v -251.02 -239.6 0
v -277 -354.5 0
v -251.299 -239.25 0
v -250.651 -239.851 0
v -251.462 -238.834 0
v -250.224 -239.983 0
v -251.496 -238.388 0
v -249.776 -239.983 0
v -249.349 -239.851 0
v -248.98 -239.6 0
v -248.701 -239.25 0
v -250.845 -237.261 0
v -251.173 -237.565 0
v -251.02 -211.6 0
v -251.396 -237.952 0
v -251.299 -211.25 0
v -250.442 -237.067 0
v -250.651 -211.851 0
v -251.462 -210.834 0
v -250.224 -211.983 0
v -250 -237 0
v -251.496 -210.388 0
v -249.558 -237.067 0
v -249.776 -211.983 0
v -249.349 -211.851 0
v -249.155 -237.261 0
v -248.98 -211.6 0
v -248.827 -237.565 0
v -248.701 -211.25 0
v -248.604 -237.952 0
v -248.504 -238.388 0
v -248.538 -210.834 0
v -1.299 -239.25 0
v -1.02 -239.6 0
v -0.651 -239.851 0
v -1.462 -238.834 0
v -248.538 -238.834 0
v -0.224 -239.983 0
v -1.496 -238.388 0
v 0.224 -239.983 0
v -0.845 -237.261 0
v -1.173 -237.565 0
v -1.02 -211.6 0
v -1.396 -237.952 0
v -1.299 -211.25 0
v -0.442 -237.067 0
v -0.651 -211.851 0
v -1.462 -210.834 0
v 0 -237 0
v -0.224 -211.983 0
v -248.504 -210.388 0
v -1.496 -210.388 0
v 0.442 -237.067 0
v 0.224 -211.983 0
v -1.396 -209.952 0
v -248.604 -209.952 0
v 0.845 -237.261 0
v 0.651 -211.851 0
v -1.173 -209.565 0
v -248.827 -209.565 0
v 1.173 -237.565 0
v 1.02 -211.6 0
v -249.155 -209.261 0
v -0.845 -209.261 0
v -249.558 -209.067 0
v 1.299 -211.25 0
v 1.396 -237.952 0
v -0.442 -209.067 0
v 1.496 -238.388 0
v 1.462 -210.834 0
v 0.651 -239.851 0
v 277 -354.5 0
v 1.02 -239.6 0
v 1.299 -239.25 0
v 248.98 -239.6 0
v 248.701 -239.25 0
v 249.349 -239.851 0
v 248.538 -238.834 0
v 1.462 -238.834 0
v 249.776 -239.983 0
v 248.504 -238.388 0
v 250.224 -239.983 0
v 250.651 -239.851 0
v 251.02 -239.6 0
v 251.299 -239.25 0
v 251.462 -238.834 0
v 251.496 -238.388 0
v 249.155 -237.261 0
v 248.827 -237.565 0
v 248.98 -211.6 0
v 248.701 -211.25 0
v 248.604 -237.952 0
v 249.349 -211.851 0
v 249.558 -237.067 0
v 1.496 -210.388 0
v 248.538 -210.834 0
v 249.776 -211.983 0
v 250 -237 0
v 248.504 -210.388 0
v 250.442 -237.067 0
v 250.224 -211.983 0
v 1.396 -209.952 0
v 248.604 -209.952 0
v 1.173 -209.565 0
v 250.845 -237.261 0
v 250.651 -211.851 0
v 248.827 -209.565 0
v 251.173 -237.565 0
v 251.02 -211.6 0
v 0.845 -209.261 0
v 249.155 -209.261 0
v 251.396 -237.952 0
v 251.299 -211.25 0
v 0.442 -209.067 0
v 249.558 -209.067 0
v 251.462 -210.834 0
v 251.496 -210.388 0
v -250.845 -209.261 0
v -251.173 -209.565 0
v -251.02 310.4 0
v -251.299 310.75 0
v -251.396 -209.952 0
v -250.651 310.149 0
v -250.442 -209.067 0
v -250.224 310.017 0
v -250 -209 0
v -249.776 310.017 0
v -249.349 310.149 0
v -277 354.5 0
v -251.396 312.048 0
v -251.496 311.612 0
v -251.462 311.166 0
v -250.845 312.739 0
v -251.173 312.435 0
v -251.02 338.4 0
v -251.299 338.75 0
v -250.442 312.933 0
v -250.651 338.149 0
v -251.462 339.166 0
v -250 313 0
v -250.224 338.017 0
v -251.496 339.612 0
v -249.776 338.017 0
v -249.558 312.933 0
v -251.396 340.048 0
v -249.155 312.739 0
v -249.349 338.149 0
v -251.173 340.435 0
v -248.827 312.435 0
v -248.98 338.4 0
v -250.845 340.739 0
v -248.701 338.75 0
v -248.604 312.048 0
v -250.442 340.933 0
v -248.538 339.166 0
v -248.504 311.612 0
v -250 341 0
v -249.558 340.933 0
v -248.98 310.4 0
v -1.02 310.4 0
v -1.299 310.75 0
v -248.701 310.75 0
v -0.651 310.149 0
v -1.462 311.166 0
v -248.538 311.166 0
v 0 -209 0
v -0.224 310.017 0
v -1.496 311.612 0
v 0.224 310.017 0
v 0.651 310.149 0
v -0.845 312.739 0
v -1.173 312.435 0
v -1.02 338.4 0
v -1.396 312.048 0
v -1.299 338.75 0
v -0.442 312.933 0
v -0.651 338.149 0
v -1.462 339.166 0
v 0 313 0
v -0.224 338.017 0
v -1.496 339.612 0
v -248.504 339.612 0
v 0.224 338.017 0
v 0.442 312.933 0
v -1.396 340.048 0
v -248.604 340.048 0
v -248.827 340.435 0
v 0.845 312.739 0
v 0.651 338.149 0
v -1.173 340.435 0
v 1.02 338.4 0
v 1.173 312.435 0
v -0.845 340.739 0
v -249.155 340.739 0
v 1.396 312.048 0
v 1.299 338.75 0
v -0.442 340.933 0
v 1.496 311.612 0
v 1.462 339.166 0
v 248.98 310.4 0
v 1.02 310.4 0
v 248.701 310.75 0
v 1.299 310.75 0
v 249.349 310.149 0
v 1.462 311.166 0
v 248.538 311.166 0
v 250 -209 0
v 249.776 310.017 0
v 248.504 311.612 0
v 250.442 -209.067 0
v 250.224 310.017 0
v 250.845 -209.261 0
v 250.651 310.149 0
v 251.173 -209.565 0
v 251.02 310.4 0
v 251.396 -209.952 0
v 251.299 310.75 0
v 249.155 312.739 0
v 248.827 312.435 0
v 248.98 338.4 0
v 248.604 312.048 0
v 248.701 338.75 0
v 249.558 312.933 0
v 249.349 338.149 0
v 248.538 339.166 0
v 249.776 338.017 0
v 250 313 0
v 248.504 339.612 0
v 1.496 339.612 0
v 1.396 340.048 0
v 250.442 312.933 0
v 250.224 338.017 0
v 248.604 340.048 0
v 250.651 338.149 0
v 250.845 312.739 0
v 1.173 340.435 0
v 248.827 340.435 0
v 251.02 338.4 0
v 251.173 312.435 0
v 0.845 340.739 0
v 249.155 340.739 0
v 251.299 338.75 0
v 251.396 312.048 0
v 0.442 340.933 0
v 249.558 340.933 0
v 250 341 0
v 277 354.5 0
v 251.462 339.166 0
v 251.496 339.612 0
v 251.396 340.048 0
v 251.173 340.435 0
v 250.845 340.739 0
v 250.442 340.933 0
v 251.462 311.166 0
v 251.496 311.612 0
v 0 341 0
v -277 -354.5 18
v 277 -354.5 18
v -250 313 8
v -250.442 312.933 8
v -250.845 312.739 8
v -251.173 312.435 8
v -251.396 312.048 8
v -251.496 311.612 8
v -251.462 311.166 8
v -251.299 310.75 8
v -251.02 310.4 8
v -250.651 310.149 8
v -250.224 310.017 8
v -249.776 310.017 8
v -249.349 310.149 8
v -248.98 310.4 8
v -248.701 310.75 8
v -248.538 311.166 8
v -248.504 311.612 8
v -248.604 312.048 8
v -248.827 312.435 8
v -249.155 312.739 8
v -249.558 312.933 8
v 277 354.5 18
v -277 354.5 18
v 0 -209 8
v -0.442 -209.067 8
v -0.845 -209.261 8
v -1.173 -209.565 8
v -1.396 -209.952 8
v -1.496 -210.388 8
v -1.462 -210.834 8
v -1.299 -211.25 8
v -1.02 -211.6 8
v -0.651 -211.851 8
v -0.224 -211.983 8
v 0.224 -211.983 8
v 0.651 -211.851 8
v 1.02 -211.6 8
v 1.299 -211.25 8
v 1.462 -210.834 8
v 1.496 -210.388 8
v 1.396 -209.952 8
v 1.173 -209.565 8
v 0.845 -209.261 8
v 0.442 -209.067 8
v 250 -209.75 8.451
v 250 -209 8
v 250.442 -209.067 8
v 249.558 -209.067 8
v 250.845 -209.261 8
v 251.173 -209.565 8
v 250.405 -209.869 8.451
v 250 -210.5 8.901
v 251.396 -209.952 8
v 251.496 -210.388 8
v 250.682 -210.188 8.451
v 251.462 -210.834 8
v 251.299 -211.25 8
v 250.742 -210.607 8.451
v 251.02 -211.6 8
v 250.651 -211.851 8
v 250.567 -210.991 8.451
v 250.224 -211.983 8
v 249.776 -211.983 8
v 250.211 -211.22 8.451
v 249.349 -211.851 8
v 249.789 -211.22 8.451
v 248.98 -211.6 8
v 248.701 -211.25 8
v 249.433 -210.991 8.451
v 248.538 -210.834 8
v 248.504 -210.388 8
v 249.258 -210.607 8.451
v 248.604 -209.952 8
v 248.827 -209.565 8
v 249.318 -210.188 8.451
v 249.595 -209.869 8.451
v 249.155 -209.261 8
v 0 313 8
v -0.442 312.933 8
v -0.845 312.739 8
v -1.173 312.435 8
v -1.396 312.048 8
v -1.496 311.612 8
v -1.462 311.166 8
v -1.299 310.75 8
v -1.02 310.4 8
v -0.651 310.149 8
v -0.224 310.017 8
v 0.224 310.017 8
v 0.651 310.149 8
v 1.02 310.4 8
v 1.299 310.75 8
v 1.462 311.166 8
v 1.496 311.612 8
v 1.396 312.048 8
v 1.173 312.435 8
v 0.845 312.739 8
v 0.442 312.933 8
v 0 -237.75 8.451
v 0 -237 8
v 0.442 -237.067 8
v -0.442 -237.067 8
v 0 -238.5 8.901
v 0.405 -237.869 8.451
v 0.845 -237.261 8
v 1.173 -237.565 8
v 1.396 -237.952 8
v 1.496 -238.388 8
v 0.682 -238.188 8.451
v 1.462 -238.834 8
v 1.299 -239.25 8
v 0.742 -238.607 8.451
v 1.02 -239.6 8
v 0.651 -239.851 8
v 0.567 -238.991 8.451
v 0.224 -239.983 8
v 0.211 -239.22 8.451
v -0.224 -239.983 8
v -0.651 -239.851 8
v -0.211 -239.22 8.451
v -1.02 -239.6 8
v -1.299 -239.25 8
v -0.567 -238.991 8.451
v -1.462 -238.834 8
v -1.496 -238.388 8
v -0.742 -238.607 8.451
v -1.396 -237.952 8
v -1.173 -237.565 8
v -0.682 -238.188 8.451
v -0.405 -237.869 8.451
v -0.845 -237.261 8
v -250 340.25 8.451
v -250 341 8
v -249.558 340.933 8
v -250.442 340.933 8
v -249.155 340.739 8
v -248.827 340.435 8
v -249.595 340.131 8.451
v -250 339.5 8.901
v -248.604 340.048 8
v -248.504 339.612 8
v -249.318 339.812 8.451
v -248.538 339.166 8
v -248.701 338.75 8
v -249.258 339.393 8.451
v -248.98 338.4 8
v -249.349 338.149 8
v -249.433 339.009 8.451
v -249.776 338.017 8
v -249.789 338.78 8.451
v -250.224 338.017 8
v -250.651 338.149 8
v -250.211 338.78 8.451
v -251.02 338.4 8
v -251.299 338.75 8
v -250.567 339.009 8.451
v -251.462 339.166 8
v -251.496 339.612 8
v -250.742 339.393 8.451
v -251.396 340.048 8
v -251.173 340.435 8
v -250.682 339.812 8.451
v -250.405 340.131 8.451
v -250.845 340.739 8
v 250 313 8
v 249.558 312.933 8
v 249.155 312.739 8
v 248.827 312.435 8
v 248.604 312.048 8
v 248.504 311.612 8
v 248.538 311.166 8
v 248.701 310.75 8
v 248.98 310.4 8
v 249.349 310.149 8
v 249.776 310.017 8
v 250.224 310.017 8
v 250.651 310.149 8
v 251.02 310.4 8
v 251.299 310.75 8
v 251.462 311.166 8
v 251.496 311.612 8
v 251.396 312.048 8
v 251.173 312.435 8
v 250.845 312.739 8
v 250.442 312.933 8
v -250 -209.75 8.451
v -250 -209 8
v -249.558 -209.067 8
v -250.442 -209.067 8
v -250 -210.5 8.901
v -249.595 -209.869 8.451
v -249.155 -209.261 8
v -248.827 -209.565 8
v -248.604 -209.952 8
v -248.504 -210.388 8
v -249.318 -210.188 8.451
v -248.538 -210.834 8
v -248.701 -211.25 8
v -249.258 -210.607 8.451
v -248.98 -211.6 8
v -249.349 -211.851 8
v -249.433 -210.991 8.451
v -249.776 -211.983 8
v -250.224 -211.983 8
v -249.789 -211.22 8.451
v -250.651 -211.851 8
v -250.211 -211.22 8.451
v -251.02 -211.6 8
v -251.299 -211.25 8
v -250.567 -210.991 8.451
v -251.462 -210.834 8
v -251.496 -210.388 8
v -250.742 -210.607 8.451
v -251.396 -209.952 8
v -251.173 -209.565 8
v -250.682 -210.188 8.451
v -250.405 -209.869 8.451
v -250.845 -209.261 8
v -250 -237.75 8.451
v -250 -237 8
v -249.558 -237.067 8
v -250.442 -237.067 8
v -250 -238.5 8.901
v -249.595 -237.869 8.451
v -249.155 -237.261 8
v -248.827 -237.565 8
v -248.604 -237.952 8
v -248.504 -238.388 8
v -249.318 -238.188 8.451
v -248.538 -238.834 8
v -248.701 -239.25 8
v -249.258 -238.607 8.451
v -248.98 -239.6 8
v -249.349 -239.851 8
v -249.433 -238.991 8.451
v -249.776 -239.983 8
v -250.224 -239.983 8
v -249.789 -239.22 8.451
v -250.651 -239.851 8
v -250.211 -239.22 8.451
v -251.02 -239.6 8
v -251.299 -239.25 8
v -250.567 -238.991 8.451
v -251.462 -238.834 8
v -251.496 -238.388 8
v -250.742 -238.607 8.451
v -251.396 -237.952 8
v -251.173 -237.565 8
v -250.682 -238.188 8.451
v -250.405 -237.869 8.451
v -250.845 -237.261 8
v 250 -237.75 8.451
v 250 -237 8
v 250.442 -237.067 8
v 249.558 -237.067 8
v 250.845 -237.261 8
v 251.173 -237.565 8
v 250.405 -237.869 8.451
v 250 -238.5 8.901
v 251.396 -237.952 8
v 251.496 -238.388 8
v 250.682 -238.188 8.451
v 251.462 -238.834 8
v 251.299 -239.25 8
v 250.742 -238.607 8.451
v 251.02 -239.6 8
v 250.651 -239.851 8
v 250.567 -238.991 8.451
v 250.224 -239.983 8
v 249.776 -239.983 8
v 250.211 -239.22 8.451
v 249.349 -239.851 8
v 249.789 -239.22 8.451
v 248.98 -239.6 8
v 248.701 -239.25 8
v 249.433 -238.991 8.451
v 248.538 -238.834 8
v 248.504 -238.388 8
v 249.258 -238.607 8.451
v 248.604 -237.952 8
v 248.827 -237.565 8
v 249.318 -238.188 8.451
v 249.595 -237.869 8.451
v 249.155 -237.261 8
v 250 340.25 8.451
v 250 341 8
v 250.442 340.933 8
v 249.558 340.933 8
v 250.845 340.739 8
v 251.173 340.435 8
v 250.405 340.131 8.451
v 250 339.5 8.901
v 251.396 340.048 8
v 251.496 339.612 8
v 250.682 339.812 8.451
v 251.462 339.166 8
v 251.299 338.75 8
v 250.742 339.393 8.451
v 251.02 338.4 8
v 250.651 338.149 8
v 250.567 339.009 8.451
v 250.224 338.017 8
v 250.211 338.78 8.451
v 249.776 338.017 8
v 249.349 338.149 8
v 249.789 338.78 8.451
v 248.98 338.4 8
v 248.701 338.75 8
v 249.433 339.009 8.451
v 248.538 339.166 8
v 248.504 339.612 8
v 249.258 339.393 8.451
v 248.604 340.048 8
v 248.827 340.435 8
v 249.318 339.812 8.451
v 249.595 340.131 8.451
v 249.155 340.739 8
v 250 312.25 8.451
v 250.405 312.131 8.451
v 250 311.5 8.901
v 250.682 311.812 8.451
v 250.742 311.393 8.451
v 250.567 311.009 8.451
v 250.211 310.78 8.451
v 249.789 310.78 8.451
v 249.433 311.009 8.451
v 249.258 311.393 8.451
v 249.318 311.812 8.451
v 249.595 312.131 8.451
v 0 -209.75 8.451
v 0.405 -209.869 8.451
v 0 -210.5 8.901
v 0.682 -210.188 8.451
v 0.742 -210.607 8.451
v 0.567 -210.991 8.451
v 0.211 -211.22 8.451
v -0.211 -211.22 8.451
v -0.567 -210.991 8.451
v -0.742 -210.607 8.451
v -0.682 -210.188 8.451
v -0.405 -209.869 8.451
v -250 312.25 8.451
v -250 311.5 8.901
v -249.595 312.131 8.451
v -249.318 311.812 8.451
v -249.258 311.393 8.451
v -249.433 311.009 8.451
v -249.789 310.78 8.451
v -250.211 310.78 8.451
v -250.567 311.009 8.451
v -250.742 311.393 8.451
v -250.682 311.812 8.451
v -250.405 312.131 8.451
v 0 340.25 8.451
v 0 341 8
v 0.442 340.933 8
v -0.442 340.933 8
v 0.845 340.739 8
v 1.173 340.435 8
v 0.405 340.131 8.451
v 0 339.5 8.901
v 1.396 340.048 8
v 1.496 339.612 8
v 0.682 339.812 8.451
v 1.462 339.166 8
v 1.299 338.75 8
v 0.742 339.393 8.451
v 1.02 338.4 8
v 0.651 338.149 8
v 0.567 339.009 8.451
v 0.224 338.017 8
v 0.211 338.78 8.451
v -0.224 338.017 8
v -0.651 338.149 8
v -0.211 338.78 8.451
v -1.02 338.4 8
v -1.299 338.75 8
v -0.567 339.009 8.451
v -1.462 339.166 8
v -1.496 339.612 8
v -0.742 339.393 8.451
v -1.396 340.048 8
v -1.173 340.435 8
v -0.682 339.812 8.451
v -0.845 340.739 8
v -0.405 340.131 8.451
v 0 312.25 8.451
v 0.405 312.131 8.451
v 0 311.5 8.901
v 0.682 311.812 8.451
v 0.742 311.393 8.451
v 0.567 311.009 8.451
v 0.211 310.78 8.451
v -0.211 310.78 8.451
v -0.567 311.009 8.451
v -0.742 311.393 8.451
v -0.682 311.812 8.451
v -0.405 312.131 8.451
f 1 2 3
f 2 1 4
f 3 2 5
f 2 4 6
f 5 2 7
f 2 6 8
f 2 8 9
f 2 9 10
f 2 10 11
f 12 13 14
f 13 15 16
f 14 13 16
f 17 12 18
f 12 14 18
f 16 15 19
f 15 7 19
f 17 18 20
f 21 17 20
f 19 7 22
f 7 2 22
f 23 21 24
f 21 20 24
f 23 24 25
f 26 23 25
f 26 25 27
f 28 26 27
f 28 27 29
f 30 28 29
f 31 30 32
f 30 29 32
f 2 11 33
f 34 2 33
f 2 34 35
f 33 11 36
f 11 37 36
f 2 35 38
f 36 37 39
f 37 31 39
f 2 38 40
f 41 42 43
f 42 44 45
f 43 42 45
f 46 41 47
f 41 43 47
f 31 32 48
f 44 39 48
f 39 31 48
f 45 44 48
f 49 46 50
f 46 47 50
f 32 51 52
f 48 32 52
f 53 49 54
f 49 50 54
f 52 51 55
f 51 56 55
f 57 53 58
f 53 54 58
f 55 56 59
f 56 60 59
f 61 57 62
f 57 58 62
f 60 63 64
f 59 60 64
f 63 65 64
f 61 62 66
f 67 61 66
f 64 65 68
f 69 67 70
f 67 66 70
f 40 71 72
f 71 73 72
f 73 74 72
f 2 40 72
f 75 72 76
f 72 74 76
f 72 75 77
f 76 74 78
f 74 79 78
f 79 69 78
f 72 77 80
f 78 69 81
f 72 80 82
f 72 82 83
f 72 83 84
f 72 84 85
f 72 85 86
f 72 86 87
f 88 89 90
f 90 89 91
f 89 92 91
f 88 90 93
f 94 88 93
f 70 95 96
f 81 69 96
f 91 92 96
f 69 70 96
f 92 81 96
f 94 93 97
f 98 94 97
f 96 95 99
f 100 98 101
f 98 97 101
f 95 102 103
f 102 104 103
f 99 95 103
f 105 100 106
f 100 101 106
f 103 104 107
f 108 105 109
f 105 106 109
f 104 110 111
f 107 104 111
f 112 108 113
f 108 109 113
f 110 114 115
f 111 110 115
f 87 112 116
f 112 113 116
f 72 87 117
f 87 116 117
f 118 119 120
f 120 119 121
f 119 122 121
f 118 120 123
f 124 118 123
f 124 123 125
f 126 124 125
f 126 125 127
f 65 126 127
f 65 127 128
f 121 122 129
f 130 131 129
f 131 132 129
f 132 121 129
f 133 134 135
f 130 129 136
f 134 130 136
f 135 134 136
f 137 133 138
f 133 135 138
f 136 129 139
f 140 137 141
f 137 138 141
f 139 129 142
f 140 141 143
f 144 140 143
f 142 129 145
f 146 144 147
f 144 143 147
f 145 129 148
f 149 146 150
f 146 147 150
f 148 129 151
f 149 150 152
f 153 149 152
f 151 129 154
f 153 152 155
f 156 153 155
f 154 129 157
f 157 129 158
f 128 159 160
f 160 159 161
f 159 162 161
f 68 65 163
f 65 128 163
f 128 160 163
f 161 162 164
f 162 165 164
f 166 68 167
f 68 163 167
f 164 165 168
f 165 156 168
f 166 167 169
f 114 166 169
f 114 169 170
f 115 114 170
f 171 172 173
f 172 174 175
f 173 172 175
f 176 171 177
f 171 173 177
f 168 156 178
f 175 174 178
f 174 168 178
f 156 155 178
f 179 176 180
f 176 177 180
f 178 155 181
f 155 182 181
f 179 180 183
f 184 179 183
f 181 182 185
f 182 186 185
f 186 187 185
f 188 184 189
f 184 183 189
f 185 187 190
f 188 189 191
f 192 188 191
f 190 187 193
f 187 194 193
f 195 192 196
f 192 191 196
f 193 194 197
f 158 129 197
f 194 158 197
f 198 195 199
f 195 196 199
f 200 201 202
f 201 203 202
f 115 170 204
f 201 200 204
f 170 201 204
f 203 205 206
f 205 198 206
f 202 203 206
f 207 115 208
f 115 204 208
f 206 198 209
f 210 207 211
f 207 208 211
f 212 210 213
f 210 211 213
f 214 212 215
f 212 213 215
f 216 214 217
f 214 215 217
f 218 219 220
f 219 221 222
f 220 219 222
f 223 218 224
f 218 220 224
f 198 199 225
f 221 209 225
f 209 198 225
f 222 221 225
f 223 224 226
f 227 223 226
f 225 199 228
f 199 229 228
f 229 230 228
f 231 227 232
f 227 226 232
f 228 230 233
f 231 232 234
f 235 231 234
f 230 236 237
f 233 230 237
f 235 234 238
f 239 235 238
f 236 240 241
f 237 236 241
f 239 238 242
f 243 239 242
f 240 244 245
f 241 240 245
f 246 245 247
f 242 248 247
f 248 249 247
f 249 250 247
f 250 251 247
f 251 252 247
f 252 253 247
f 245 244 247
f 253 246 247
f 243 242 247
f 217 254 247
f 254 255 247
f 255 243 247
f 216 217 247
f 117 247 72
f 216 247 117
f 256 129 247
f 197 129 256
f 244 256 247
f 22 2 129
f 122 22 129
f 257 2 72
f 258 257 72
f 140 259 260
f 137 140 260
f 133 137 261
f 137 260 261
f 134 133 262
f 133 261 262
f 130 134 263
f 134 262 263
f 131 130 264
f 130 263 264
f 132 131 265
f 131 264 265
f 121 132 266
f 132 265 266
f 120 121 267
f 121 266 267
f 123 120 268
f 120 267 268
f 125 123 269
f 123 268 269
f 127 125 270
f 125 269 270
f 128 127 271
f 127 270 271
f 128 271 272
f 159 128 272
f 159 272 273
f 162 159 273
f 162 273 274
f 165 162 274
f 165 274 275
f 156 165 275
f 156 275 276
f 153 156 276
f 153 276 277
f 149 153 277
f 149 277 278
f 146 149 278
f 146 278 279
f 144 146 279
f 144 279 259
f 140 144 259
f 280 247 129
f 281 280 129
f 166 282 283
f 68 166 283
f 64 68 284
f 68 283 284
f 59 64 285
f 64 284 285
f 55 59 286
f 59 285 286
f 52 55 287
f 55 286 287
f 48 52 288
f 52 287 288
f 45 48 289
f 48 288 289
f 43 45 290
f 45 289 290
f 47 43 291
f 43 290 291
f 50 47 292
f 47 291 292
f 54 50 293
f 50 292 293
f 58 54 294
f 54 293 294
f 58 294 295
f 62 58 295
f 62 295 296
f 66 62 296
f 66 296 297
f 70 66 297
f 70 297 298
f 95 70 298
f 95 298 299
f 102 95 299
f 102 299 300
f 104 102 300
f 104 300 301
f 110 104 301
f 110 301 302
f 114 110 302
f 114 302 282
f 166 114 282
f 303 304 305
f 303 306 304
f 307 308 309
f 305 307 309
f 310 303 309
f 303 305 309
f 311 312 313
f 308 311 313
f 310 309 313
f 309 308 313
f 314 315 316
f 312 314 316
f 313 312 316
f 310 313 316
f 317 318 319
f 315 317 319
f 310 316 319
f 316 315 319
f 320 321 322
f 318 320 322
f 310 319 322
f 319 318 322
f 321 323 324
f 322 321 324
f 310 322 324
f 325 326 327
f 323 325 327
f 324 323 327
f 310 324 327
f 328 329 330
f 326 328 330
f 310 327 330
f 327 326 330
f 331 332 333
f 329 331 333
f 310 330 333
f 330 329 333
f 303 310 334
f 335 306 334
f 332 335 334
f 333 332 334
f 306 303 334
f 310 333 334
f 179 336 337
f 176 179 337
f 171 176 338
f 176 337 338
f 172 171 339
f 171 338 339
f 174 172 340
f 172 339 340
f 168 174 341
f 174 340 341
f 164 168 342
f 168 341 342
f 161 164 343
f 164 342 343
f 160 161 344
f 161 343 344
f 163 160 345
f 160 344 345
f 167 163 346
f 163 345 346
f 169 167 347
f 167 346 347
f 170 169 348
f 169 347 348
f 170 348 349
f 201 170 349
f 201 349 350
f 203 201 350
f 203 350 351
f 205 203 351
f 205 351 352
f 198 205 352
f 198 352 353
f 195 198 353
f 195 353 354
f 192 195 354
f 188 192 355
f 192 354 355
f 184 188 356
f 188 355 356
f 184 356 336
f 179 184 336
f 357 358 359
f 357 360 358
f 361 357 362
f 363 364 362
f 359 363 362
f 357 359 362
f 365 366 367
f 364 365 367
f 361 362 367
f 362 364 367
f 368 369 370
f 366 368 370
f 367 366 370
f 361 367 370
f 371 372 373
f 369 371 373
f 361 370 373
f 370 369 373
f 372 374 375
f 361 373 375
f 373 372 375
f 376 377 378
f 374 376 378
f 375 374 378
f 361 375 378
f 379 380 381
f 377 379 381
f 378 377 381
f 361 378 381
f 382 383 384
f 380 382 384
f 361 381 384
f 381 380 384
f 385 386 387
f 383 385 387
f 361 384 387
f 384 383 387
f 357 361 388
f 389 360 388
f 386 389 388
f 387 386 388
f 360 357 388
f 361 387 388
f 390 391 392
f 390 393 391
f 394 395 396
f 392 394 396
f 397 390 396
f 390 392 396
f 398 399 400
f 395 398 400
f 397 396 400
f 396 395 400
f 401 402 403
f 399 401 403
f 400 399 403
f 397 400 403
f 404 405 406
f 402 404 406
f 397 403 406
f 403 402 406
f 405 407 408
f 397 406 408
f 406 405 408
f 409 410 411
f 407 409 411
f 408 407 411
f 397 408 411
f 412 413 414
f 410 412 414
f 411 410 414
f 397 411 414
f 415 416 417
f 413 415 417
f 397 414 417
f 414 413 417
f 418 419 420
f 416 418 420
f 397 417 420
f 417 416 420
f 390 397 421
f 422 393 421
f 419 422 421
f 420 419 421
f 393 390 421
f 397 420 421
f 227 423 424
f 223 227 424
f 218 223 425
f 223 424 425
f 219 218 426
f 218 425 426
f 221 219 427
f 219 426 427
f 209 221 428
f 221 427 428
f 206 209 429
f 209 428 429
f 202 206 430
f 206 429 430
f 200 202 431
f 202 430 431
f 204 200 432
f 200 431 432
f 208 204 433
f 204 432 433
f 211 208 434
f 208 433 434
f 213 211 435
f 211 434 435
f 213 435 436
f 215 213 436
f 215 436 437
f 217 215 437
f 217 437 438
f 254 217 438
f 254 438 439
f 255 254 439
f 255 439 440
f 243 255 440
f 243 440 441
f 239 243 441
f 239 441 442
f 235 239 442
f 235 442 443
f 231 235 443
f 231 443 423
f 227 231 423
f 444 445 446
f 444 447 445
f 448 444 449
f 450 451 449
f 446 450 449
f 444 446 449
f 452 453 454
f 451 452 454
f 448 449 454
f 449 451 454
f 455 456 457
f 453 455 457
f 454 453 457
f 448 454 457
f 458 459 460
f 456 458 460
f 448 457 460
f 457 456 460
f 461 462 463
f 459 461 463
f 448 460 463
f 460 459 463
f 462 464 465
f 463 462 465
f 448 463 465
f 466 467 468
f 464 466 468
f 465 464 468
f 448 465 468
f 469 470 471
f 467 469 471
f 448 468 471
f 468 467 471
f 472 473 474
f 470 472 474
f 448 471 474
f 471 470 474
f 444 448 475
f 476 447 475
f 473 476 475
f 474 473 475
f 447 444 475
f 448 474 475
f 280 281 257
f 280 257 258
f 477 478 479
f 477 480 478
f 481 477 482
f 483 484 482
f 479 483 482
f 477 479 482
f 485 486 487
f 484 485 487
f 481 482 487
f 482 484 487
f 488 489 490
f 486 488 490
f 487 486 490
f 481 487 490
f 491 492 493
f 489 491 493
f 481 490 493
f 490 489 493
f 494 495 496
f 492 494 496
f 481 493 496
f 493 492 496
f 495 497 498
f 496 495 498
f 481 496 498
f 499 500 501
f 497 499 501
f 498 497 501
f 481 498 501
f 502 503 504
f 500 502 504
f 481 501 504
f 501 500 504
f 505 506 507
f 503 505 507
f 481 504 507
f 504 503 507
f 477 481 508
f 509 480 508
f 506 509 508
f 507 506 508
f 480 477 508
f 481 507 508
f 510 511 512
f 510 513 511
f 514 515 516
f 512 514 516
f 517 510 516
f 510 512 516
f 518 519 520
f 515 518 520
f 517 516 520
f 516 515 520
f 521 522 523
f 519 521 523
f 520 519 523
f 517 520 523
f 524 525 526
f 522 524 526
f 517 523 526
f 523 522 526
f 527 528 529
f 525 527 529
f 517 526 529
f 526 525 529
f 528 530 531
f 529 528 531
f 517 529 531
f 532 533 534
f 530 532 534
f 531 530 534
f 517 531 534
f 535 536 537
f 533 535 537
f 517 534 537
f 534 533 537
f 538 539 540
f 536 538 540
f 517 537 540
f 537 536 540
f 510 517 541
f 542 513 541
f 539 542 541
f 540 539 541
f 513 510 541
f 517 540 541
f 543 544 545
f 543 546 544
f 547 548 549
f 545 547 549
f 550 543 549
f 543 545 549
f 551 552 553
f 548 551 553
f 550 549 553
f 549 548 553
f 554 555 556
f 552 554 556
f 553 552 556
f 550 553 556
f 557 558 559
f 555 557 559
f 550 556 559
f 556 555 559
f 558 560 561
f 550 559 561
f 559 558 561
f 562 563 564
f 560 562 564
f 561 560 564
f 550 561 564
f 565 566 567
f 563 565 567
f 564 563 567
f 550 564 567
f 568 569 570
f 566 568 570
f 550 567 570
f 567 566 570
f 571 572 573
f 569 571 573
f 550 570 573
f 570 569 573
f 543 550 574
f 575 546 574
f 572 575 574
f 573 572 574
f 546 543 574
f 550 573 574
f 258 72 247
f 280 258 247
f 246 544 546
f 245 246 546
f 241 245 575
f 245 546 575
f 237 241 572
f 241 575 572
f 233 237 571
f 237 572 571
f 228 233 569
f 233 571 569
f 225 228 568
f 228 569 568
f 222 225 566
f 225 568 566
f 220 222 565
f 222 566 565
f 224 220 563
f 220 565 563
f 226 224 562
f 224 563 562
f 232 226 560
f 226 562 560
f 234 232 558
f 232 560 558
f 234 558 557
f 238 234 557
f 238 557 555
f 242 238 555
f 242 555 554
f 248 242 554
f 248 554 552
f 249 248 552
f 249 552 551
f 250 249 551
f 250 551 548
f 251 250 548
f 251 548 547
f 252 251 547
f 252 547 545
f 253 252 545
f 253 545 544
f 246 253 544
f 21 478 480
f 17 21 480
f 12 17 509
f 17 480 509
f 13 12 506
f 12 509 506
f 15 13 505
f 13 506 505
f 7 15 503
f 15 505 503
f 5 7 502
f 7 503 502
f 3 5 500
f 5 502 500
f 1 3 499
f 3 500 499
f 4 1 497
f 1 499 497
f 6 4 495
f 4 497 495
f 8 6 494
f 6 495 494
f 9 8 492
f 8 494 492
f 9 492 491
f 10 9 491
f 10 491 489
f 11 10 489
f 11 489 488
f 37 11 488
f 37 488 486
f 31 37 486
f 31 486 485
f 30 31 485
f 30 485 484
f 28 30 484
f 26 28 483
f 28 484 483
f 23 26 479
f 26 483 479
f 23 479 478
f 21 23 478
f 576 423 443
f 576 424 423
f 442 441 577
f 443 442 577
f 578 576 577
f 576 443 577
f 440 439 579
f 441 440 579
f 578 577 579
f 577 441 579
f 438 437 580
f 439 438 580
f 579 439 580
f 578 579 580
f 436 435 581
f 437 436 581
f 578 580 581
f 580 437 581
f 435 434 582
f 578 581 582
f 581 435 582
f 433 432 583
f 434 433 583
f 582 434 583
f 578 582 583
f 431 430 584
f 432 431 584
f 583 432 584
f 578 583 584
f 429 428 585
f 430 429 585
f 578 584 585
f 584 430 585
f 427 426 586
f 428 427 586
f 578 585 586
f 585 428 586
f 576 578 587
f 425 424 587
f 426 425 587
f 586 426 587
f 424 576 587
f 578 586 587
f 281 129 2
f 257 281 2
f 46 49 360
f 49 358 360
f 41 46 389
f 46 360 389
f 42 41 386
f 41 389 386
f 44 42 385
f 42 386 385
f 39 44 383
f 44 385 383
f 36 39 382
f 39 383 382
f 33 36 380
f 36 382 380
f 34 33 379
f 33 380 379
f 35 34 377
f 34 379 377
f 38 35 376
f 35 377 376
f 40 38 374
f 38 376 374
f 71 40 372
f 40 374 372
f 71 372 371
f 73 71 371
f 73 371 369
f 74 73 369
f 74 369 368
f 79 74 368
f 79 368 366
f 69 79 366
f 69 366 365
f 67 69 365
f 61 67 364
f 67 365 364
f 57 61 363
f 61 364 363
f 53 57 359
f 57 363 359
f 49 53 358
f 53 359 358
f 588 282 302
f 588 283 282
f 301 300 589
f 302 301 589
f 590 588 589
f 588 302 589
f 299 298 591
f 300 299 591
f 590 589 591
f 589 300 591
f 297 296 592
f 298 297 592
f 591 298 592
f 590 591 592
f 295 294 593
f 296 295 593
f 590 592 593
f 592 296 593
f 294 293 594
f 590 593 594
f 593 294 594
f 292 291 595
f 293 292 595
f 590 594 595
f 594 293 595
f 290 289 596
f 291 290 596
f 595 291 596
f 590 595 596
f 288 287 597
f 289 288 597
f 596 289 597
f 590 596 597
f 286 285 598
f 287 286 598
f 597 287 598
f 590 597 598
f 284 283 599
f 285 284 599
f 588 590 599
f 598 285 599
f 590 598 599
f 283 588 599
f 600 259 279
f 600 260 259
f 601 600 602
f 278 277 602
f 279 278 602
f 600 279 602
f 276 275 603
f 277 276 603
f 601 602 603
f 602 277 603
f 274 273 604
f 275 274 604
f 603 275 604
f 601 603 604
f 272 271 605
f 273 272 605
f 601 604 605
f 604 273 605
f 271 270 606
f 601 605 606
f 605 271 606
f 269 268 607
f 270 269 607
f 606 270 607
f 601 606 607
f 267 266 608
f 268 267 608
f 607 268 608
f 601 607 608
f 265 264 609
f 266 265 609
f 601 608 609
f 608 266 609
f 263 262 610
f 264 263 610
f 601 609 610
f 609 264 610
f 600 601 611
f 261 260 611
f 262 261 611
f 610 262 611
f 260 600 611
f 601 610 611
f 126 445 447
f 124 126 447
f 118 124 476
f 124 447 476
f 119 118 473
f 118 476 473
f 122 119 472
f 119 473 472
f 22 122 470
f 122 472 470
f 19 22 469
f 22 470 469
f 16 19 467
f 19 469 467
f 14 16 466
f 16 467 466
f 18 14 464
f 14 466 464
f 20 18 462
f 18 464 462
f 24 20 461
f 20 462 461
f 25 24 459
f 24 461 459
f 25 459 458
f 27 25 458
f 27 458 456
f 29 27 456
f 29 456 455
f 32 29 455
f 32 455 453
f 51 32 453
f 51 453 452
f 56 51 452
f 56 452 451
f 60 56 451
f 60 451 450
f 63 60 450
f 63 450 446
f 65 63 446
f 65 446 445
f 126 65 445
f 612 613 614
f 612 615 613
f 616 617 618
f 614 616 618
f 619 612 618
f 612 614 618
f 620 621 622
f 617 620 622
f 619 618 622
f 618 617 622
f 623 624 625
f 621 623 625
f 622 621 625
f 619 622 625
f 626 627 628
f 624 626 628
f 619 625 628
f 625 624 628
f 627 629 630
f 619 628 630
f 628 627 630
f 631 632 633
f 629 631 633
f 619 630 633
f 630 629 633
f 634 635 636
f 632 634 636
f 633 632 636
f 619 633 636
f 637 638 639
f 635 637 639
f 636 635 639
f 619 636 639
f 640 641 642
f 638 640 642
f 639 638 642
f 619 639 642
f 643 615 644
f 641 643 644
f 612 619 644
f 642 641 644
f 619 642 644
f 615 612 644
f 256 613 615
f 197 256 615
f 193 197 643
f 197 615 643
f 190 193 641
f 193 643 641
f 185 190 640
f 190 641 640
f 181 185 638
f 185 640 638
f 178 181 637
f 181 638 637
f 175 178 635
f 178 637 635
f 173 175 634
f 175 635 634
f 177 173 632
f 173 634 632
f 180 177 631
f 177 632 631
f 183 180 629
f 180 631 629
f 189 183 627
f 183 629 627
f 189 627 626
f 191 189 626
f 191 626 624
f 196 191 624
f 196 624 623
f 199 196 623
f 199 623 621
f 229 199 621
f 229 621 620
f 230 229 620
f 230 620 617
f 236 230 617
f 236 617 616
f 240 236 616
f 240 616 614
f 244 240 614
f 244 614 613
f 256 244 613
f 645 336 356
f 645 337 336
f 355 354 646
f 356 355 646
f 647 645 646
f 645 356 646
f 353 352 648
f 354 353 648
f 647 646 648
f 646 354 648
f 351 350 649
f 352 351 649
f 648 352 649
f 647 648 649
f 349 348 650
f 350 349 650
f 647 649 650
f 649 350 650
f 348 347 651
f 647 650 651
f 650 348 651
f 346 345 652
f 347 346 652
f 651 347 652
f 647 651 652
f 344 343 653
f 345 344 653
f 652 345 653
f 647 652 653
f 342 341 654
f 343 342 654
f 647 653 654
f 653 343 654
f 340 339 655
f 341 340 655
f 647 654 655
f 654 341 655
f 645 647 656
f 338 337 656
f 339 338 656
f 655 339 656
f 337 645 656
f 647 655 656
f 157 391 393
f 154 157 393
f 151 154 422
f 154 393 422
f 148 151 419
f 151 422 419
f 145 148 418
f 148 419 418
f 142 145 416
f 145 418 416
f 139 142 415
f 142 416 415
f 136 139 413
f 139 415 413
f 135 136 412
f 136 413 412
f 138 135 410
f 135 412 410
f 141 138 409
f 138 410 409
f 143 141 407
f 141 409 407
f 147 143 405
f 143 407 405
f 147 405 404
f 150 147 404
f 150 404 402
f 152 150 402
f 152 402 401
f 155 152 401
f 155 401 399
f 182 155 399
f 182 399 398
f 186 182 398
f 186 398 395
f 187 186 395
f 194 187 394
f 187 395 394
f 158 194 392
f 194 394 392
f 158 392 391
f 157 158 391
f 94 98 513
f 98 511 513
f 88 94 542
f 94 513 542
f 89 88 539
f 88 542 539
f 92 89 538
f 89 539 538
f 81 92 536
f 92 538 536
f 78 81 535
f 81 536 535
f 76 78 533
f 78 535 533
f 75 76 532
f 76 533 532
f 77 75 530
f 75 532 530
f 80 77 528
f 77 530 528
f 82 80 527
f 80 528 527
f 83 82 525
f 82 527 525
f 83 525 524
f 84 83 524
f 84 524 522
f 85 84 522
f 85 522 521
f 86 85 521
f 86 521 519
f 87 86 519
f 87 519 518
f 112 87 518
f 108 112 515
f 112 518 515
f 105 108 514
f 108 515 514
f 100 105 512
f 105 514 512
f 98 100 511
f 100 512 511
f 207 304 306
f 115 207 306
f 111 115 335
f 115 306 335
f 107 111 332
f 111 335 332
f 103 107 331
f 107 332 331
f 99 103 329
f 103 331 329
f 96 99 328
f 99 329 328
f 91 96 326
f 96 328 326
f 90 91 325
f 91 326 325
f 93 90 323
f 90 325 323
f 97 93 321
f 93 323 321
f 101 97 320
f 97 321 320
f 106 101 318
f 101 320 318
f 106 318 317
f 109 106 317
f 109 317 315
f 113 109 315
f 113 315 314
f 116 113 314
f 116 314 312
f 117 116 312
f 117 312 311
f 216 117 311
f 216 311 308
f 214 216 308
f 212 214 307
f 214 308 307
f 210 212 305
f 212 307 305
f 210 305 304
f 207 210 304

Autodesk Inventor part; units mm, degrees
ref_plane "YZ Plane" through (0, 0, 0) normal (1, 0, 0) x (0, 1, 0)
ref_plane "XZ Plane" through (0, 0, 0) normal (0, 1, 0) x (-1, 0, 0)
ref_plane "XY Plane" through (0, 0, 0) normal (0, 0, 1) x (1, 0, 0)
sketch "Sketch1" plane through (0, 0, 0) normal (0, 0, 1) x (1, 0, 0)
  line L0 (-277, -354.5) -> (277, -354.5)
  line L1 (277, -354.5) -> (277, 354.5)
  line L2 (277, 354.5) -> (-277, 354.5)
  line L3 (-277, 354.5) -> (-277, -354.5)
  line L4 (-277, -354.5) -> (277, 354.5) construction
  line L5 (277, -354.5) -> (-277, 354.5) construction
  line L6 (0, 0) -> (0, 354.5) construction
  line L7 (250, 311.5) -> (-250, 311.5) construction
  line L8 (-250, 311.5) -> (-250, 339.5) construction
  line L9 (-250, 339.5) -> (250, 339.5) construction
  line L10 (250, 339.5) -> (250, 311.5) construction
  line L11 (250, 311.5) -> (-250, 339.5) construction
  line L12 (-250, 311.5) -> (250, 339.5) construction
  point P0 (0, 325.5)
  point P1 (0, 311.5)
  point P2 (0, 339.5)
  dimension "d0" = 554
  dimension "d1" = 709
  dimension "d4" = 500
  dimension "d5" = 28
  dimension "d6" = 15
extrude "Extrusion1" add sketch "Sketch1" along normal blind 18
hole "Hole1" at (-250, 311.5, 0) at (-250, 339.5, 0) at (0, 311.5, 0) at (0, 339.5, 0) at (250, 339.5, 0) at (250, 311.5, 0) direction (0, 0, 1) diameter 3 depth 8 tip angle 118
pattern_linear "Rectangular Pattern1" count 2 spacing 550 along (0, -1, 0) of "Hole1"
properties part number "wozek_podstawa"
